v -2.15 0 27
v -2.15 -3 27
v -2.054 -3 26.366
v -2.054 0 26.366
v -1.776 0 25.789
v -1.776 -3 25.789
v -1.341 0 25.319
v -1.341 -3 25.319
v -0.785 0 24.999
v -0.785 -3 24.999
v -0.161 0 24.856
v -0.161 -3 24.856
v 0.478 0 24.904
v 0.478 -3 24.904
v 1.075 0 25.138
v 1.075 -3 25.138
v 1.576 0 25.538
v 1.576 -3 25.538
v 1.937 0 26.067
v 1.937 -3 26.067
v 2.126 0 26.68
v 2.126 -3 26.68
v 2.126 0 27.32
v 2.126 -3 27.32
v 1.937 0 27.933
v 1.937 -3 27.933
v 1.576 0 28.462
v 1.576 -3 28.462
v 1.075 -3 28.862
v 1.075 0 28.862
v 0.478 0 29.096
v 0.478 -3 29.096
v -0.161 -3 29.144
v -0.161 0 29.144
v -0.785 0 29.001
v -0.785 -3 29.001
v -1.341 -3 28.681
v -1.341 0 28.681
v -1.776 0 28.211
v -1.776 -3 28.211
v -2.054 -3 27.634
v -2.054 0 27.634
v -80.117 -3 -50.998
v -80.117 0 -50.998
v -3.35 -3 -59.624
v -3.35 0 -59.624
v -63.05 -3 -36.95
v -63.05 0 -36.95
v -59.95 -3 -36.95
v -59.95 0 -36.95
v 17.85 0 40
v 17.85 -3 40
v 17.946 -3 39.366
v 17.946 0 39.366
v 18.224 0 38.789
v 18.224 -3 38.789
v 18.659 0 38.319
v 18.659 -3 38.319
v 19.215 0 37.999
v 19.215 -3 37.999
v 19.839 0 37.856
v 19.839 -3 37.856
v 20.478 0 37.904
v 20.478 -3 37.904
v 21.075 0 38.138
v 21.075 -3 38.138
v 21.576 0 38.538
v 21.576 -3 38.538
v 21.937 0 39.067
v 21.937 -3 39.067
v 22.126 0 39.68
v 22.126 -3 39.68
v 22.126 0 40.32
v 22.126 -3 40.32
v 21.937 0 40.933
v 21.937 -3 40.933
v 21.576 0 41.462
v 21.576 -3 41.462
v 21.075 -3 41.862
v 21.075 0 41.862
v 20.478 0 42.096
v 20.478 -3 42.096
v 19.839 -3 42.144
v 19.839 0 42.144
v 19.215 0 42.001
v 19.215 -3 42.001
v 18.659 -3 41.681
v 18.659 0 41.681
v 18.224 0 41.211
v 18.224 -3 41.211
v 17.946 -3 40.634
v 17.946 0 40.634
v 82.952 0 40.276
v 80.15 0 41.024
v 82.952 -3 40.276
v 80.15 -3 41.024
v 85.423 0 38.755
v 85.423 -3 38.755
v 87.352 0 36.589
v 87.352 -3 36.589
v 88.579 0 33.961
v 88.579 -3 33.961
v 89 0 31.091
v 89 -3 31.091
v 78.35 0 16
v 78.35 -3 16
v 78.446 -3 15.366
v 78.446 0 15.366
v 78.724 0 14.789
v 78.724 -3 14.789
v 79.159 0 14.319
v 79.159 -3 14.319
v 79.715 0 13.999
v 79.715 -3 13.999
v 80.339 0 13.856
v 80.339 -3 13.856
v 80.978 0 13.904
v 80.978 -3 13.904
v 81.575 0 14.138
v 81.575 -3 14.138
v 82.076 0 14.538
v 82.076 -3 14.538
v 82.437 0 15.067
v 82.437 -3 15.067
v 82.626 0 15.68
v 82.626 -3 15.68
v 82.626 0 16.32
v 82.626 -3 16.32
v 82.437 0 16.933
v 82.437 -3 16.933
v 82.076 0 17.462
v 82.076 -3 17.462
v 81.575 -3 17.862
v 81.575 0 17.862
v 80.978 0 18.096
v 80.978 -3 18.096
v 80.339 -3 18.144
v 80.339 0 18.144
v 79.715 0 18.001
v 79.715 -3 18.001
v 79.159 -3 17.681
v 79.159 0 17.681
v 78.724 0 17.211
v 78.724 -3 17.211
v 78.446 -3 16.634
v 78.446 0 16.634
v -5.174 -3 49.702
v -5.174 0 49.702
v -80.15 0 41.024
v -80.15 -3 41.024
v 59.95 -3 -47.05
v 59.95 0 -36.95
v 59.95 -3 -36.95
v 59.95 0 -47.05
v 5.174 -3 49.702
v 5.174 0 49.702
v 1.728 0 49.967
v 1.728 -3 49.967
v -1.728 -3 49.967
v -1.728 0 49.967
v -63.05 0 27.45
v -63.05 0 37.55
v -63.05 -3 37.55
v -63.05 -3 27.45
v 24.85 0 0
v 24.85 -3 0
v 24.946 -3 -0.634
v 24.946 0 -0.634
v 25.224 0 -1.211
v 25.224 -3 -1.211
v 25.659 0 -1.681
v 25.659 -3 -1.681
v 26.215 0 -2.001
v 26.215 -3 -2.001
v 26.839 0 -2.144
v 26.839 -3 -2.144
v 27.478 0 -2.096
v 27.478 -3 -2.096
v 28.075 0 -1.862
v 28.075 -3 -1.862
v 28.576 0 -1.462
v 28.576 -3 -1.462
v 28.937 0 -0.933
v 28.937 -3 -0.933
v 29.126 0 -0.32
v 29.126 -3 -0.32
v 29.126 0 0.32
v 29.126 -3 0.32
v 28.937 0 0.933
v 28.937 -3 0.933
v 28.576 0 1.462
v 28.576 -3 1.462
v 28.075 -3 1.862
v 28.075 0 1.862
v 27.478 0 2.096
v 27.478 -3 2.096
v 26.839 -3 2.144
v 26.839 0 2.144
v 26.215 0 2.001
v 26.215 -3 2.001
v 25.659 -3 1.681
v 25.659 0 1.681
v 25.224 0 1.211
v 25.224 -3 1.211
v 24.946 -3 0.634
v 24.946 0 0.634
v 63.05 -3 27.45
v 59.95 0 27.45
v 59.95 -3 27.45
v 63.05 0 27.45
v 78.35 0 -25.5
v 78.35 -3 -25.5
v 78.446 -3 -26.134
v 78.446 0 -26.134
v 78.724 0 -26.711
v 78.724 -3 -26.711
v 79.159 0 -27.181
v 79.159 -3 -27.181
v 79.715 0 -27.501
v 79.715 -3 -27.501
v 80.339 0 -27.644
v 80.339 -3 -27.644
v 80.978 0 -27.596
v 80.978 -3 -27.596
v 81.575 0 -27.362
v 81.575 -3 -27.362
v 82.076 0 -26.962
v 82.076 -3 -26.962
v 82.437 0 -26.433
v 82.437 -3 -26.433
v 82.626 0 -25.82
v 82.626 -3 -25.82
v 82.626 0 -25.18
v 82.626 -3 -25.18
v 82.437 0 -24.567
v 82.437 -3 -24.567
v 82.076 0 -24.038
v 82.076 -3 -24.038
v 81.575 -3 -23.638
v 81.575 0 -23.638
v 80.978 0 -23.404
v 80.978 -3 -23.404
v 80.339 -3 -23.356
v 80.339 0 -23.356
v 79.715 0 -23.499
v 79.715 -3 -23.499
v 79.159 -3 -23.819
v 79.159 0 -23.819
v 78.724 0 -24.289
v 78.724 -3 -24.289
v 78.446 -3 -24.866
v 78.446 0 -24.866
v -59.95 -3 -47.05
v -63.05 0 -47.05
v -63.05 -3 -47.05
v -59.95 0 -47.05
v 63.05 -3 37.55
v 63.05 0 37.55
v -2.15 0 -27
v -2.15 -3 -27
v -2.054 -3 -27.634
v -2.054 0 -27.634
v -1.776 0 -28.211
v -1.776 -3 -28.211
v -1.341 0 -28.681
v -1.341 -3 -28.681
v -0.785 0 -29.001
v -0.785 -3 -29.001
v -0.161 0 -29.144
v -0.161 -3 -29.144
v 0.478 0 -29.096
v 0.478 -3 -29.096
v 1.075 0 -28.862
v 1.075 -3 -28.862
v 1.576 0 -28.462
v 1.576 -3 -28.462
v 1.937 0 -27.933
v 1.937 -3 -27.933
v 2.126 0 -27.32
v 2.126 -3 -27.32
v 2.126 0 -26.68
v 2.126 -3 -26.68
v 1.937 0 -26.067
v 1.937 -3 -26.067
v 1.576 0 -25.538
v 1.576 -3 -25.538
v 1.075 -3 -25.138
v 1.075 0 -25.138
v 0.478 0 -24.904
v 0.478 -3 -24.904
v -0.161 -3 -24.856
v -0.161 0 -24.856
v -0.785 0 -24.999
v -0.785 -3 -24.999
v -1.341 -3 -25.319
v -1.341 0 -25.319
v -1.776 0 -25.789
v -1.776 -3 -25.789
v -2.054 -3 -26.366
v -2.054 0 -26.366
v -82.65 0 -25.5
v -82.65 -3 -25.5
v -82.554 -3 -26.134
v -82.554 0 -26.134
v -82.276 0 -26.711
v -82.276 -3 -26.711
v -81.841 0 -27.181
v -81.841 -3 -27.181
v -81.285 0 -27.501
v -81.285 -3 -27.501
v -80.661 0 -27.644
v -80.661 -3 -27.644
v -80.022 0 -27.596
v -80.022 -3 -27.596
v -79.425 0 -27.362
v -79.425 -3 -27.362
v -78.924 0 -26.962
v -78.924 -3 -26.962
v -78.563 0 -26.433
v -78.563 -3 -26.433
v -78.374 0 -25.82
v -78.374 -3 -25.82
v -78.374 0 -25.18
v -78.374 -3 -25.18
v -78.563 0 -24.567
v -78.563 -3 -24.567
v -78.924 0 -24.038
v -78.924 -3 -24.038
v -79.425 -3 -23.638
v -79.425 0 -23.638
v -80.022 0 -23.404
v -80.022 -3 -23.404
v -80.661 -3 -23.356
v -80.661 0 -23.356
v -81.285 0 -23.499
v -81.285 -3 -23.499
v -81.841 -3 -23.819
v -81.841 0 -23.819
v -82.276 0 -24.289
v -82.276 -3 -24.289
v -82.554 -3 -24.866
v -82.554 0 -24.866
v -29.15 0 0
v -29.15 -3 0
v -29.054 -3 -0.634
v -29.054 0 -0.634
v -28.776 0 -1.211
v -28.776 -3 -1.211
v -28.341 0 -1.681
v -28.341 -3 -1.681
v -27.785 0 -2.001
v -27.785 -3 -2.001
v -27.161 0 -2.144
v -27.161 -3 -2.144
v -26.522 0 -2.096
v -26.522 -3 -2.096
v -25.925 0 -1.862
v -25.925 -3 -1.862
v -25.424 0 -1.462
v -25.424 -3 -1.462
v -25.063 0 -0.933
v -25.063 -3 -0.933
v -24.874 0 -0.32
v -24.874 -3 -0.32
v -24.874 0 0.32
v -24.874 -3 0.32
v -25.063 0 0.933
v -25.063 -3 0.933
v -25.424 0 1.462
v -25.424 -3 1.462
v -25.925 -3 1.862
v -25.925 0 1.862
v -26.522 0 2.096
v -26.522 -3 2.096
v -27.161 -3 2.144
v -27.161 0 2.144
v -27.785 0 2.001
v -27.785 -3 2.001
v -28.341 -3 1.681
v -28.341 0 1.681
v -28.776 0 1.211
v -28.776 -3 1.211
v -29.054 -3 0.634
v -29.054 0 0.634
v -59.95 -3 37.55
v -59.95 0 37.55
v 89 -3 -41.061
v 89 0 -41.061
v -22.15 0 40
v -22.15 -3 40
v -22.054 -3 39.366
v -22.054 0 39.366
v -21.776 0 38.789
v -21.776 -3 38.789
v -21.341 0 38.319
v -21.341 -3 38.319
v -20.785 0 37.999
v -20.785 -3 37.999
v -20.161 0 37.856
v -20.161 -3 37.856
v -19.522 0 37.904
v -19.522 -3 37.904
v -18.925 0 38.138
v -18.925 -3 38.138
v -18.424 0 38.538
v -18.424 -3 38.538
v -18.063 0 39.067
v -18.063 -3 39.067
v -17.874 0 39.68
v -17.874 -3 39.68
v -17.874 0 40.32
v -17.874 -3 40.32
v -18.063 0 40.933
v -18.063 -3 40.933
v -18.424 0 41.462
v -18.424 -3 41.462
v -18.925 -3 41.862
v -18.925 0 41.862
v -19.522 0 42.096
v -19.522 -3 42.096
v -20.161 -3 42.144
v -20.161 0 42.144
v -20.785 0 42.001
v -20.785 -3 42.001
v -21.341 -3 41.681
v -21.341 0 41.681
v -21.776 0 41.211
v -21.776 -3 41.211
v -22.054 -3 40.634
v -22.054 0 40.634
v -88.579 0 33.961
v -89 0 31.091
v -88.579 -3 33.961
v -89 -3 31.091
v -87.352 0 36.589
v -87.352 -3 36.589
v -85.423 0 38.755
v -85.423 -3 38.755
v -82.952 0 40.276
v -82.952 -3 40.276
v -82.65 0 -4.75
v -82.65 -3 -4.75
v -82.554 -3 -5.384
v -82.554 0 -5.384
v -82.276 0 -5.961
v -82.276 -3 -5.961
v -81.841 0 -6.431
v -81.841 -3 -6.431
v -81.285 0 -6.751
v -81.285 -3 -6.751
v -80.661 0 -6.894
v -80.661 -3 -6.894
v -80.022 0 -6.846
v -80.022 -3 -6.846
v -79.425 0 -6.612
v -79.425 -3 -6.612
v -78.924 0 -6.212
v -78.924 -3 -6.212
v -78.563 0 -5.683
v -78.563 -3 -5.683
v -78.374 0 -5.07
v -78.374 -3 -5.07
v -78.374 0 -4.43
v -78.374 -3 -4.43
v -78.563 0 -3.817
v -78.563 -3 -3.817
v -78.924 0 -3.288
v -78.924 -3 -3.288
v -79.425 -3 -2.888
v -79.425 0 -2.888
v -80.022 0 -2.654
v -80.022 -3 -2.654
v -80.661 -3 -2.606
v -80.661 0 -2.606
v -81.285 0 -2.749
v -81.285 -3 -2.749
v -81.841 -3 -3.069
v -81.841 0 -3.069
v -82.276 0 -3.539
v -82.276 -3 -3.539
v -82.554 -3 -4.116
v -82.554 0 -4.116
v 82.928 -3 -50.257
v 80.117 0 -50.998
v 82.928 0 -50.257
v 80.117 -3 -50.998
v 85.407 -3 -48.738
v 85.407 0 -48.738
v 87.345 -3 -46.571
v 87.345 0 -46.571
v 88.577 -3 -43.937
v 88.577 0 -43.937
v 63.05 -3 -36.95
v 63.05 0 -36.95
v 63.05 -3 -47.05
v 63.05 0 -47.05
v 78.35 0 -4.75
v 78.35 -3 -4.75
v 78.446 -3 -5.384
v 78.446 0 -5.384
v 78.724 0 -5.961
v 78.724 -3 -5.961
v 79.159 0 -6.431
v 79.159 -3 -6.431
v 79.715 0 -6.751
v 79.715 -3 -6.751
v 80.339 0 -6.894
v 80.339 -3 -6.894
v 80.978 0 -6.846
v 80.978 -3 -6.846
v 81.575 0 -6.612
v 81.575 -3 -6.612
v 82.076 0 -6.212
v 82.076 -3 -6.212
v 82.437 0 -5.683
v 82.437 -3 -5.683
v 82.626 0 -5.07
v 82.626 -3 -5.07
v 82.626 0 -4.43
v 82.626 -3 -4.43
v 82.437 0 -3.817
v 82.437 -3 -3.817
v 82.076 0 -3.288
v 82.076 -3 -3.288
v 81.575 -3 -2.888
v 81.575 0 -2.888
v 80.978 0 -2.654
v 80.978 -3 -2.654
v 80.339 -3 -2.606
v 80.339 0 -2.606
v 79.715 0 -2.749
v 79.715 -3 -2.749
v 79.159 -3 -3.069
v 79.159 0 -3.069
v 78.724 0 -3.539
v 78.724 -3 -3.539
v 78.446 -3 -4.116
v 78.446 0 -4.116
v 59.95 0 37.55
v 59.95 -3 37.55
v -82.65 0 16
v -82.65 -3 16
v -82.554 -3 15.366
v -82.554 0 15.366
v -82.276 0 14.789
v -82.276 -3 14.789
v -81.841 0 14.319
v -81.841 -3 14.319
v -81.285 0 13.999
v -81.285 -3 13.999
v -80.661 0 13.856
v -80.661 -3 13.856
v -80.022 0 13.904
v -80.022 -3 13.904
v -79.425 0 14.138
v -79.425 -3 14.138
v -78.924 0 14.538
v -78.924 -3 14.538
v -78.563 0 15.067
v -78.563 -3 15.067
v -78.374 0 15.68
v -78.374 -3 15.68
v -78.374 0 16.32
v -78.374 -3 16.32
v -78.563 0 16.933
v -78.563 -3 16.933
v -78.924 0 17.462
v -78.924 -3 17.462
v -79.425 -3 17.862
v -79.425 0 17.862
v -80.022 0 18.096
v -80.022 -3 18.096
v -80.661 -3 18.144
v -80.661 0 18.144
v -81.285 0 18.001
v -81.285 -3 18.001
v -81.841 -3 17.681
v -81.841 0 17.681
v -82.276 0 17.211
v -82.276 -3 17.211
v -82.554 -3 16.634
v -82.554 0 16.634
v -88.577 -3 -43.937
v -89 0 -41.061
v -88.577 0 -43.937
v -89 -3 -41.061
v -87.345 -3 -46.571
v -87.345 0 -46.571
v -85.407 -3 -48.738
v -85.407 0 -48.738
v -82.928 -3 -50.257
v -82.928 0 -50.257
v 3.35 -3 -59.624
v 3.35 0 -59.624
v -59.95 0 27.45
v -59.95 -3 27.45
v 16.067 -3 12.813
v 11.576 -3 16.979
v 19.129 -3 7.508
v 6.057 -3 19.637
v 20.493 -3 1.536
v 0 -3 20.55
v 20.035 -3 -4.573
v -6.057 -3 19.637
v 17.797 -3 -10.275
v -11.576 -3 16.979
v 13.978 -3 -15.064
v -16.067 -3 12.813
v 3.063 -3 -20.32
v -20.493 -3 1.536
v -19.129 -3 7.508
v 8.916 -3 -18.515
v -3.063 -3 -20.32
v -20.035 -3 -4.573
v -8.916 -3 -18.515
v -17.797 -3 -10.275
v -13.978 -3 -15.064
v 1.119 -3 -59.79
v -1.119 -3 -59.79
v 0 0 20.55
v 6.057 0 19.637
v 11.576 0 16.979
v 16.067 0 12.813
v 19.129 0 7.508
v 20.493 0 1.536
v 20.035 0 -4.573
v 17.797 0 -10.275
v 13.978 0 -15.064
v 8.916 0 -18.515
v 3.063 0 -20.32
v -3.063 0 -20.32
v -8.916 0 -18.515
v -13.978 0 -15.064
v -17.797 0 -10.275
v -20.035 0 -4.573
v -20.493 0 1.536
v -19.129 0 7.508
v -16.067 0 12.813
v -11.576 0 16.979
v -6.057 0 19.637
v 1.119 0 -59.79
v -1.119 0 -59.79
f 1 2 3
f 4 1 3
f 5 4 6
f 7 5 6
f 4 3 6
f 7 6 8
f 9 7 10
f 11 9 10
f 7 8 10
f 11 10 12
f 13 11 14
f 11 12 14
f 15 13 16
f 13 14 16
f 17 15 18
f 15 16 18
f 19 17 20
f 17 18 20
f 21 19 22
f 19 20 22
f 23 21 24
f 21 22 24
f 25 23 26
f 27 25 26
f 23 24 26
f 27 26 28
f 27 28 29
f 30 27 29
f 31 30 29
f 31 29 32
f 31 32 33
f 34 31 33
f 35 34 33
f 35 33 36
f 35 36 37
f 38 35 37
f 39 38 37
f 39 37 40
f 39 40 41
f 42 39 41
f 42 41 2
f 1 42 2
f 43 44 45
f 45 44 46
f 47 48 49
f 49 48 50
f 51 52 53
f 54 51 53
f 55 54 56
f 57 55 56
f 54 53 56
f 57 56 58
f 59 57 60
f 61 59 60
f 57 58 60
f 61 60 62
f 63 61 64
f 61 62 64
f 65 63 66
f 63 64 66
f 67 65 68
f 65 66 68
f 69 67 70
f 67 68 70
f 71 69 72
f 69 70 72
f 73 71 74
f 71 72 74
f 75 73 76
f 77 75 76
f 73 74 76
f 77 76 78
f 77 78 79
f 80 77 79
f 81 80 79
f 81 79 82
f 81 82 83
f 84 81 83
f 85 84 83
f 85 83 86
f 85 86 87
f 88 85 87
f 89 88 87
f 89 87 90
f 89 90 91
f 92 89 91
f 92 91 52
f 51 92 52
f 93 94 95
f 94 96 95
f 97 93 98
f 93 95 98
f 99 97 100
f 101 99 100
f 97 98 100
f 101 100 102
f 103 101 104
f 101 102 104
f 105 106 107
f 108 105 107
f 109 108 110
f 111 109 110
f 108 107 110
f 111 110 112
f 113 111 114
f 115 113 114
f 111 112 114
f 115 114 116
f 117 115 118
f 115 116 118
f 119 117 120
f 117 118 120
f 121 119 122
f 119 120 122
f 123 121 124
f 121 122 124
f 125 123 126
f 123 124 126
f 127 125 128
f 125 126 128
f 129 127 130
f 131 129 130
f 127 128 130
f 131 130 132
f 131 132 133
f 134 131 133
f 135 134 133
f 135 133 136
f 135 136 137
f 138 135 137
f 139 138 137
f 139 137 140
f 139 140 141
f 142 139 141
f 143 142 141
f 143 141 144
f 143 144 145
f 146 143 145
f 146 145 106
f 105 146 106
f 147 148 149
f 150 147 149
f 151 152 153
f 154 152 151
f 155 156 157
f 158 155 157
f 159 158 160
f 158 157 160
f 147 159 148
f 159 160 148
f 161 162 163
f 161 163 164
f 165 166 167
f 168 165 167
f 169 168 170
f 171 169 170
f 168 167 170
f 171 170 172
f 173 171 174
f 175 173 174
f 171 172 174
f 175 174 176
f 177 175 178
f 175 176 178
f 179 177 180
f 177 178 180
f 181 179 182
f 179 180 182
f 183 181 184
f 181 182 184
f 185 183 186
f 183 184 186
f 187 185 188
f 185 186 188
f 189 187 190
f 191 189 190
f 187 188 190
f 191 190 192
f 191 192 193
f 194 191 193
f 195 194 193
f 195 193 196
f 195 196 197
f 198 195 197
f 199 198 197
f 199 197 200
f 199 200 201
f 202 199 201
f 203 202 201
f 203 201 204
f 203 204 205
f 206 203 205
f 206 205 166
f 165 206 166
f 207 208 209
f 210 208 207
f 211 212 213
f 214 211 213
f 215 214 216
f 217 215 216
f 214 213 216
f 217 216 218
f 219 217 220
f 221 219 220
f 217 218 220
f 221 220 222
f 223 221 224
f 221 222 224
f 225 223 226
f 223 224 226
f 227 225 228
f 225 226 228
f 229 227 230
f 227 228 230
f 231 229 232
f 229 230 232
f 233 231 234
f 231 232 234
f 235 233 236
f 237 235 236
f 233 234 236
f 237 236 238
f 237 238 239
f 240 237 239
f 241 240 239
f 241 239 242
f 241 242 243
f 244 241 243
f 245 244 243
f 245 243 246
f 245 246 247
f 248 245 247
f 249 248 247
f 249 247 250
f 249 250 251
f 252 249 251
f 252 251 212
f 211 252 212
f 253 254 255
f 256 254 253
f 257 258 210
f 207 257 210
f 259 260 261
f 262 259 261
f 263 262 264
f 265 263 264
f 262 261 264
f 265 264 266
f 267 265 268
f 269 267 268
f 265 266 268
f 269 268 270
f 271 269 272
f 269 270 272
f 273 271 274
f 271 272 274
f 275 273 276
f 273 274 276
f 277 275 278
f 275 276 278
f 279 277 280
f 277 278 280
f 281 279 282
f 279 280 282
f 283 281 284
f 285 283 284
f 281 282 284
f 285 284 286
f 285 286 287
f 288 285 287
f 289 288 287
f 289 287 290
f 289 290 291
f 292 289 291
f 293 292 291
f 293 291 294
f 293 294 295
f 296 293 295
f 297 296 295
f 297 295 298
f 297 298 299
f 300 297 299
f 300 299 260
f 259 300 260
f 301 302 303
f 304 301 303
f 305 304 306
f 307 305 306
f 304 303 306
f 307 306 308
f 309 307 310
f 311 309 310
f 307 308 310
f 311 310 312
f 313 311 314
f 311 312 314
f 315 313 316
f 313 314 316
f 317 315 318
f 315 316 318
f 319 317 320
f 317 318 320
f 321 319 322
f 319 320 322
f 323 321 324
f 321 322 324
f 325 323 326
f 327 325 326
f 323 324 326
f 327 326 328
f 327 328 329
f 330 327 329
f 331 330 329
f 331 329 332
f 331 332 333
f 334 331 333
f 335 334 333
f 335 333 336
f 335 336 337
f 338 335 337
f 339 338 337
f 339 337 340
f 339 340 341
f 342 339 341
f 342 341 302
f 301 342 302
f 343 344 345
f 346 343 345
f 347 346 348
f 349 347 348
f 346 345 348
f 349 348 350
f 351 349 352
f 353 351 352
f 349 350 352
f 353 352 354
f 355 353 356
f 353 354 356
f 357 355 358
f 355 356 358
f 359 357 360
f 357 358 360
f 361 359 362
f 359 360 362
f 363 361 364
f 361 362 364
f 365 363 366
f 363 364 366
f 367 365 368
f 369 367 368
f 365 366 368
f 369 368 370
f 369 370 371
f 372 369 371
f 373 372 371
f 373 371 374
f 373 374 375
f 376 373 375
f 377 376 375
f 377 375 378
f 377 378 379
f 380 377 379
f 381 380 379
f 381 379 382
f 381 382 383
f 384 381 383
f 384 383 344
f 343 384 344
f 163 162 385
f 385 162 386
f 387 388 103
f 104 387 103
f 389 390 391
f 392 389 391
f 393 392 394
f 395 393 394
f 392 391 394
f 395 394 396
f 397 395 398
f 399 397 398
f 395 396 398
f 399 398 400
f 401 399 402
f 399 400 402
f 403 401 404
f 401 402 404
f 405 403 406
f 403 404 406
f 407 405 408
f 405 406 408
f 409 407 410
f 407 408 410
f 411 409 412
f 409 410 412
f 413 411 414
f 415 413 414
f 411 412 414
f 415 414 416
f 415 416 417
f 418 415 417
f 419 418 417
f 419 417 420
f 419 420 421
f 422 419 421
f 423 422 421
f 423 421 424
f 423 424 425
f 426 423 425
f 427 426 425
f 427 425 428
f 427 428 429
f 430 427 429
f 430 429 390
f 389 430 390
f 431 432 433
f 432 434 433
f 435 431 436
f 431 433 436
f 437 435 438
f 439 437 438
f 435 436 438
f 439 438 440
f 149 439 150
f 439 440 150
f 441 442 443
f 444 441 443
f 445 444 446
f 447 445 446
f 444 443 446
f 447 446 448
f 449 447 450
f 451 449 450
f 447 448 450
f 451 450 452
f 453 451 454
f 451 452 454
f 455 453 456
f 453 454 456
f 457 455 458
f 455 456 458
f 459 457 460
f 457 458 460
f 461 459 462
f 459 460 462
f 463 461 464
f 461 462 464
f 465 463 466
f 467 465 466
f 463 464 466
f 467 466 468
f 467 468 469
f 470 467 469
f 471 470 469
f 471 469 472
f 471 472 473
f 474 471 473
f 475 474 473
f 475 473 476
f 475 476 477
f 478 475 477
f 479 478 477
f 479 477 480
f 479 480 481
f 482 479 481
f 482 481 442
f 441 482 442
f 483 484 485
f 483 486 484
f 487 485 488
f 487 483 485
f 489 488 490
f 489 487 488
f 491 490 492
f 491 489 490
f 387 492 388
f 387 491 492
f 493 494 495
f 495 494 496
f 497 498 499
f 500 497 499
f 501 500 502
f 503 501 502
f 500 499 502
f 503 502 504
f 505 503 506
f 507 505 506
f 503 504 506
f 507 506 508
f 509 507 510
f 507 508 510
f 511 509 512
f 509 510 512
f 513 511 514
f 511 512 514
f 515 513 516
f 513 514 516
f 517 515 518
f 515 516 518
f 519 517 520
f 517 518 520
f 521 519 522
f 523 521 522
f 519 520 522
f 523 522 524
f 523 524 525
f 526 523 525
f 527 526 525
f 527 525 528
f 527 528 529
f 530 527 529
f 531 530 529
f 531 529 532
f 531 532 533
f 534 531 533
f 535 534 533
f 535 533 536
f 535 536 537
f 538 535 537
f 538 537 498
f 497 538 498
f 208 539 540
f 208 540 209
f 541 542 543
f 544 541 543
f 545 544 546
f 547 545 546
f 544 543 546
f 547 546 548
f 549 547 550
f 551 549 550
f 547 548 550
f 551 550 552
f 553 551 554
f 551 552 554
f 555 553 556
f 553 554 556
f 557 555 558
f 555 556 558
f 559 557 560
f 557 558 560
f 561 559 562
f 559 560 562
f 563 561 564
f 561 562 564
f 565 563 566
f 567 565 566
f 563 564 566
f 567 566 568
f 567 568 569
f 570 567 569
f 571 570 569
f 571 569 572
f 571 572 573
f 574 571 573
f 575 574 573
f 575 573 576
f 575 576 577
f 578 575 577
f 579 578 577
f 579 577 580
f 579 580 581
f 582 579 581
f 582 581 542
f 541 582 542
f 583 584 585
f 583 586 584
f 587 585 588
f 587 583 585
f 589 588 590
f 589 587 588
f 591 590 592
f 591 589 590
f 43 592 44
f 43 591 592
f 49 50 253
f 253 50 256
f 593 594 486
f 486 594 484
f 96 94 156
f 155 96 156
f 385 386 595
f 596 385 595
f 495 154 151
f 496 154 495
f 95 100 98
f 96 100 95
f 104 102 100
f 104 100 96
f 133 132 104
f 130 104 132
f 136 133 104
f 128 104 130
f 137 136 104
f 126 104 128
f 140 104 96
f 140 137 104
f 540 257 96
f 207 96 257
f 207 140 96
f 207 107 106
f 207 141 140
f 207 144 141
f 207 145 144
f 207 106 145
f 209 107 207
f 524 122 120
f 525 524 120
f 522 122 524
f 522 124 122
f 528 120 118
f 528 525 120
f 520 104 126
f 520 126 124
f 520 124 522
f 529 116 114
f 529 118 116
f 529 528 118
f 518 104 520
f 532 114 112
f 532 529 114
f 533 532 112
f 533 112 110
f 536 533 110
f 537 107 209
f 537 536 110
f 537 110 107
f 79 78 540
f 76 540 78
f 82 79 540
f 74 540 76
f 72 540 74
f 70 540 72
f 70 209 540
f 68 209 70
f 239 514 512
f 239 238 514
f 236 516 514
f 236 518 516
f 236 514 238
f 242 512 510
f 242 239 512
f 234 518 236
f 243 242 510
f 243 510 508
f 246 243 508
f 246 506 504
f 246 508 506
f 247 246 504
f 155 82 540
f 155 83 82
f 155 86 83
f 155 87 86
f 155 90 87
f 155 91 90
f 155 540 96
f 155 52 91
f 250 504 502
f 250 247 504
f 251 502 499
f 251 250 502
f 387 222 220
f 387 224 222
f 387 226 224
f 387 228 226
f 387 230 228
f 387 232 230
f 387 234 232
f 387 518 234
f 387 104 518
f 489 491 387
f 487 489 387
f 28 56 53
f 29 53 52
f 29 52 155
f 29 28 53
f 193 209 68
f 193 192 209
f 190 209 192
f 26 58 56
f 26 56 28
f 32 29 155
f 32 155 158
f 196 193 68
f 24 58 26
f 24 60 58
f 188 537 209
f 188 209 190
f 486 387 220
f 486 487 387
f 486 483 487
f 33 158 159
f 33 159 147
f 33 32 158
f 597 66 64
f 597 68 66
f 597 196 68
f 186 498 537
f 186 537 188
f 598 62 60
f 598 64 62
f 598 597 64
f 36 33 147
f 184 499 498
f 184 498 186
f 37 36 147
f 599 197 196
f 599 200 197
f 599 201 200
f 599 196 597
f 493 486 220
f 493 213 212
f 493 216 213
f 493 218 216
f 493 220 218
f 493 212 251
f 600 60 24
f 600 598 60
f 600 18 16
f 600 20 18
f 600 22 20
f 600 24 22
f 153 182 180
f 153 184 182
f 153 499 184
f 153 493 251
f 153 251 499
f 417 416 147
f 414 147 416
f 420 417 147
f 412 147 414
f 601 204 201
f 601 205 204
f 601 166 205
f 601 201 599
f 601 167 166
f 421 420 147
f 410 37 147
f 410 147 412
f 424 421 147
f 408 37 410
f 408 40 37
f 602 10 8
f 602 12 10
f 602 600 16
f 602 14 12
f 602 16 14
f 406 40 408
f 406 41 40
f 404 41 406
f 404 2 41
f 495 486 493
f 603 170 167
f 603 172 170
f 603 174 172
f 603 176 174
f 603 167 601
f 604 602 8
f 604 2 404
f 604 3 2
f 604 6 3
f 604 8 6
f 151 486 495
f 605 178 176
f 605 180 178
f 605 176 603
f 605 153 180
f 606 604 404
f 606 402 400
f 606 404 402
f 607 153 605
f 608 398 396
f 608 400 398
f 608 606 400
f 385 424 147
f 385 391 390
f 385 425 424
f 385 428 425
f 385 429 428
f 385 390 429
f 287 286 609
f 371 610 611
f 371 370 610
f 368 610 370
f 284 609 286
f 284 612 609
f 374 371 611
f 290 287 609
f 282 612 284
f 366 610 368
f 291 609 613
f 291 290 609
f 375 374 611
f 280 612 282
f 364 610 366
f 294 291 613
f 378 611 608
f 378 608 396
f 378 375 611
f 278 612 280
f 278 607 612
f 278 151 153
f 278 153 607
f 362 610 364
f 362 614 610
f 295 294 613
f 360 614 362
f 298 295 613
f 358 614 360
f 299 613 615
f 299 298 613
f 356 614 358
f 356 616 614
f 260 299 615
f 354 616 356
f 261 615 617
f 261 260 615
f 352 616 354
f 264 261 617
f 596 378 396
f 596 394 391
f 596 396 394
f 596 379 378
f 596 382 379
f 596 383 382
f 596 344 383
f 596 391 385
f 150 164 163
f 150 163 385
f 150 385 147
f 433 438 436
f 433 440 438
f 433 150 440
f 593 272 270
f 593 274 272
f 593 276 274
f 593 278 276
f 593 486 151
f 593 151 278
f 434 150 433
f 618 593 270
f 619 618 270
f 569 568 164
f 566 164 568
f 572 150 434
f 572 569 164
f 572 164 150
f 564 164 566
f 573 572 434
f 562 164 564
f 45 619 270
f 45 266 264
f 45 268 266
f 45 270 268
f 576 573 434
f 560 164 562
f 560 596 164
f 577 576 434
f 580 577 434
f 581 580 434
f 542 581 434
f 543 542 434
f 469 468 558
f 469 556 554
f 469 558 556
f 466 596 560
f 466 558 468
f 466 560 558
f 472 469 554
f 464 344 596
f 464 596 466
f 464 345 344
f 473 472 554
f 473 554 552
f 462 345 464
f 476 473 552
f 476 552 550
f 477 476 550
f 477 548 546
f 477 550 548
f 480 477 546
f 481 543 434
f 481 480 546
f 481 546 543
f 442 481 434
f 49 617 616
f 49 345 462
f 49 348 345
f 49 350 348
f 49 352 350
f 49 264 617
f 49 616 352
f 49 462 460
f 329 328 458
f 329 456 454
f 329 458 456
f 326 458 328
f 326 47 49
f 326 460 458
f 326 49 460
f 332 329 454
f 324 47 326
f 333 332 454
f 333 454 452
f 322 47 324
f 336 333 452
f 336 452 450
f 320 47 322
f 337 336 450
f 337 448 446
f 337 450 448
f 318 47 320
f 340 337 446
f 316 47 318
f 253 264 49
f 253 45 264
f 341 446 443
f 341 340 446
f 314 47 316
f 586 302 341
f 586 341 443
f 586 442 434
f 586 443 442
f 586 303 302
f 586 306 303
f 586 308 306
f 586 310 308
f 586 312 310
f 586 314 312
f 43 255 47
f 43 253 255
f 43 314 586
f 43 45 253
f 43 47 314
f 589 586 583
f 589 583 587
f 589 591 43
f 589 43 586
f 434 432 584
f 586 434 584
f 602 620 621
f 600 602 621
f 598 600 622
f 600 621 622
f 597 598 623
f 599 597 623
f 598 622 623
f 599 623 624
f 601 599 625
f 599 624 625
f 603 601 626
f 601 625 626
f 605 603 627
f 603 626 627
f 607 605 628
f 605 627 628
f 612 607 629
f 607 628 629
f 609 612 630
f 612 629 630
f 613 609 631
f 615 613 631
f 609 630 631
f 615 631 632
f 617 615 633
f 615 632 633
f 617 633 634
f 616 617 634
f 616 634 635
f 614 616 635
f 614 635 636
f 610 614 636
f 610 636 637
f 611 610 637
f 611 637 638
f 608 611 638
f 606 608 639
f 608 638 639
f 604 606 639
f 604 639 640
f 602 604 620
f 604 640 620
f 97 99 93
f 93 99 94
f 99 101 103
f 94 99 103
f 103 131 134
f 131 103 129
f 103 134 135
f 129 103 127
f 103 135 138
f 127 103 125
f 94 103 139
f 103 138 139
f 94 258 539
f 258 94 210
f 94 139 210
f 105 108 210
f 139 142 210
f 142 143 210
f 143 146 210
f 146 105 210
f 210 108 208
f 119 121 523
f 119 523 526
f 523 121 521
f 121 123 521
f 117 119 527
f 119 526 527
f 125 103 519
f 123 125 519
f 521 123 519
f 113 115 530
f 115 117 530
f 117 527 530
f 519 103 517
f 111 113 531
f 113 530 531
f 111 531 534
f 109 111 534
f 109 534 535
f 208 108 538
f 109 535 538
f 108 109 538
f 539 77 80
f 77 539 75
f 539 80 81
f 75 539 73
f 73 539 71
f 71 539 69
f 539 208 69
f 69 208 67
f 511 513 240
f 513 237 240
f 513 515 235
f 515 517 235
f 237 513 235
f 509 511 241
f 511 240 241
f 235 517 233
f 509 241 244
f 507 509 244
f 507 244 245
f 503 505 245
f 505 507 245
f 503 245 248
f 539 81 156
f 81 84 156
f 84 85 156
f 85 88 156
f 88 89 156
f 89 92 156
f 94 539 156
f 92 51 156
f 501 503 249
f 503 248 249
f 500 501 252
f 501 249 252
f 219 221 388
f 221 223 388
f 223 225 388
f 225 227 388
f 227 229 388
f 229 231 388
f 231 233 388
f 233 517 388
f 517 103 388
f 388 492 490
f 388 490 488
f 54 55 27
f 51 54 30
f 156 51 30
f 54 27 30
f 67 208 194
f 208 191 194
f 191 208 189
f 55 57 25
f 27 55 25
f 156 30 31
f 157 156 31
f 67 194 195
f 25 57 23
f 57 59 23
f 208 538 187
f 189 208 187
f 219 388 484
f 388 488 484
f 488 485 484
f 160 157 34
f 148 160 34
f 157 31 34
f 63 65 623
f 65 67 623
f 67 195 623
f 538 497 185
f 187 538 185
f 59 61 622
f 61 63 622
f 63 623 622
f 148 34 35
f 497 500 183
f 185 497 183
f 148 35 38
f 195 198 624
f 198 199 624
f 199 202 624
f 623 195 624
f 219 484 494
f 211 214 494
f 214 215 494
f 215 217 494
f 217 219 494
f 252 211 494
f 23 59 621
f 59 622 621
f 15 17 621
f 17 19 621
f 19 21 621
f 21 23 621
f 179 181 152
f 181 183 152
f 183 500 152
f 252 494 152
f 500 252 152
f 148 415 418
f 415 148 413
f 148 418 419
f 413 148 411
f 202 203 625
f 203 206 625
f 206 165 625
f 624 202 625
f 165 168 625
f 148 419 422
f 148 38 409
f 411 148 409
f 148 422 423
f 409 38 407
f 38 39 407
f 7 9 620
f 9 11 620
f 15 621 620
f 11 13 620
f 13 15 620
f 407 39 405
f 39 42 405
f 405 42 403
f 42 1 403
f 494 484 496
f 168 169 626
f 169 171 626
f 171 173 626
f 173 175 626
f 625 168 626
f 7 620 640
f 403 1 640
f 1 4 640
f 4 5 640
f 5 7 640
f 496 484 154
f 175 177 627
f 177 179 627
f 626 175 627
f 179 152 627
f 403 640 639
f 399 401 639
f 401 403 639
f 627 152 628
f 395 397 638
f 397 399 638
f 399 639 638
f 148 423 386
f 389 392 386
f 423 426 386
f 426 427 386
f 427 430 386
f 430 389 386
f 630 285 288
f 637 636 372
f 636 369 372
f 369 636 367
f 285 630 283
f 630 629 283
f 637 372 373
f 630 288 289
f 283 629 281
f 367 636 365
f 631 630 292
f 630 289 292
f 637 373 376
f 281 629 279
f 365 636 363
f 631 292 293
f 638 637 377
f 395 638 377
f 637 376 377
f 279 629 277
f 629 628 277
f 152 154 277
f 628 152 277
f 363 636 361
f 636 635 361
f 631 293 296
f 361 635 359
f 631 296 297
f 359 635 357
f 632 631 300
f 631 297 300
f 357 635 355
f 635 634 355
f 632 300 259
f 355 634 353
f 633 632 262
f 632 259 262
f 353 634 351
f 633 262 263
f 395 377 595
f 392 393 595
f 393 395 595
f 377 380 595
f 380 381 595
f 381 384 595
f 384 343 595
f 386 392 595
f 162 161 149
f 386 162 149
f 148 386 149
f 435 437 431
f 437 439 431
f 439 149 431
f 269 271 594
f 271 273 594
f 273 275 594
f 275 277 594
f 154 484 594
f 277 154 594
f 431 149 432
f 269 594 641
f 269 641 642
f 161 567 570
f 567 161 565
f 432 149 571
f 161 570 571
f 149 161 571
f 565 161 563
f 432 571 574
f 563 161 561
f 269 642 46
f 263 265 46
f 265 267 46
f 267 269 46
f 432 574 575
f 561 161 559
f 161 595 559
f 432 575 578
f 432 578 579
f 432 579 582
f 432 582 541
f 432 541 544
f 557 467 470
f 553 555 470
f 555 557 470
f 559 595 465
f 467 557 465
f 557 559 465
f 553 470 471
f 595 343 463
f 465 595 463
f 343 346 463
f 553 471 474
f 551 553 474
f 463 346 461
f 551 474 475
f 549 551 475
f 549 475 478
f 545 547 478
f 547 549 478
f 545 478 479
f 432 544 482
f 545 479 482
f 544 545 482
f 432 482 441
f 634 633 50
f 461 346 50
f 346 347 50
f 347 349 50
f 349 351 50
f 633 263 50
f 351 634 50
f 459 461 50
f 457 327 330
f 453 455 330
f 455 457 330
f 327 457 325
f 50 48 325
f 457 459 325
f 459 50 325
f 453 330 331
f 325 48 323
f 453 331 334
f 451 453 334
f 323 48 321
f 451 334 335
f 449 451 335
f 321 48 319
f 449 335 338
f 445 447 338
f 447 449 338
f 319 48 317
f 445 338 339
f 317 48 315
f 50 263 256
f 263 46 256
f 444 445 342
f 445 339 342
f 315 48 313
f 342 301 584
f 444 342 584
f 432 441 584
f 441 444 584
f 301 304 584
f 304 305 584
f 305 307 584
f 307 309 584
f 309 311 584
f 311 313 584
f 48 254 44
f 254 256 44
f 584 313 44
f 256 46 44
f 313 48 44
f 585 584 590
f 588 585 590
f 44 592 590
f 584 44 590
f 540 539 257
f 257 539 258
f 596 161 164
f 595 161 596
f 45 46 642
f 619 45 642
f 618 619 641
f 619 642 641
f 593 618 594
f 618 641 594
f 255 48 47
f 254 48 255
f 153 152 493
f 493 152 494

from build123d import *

# Parameters (mm, degrees)
SKETCH1_R                = 20.55
SKETCH1_R_2              = 1
SKETCH1_W                = 3.1
SKETCH1_H                = 10.1
BASE_FLANGE1_DEPTH       = 3
FILLET1_R                = 10
M4_CLEARANCE_HOLE2_D     = 4.3
M4_CLEARANCE_HOLE2_DEPTH = 136
M4_CLEARANCE_HOLE2_TIP   = 1.291850331


# Sheet-metal steps are written as plain solids
with BuildPart() as part:
    # Sketch1 → Base-Flange1 (new body)
    with BuildSketch(Plane(origin=(0, 0, 0), x_dir=(1, 0, 0), z_dir=(0, 1, 0))):
        with BuildLine():
            Line((-89, -40), (-89, 50))
            Line((-89, 50), (-3.349708355, 59.623628275))
            ThreePointArc((-3.349708355, 59.623628275), (0, 59.811223911), (3.349708355, 59.623628275))
            Line((3.349708355, 59.623628275), (89, 50))
            Line((89, 50), (89, -40))
            Line((89, -40), (5.17352088, -49.701618334))
            ThreePointArc((5.17352088, -49.701618334), (0, -50), (-5.17352088, -49.701618334))
            Line((-5.17352088, -49.701618334), (-89, -40))
        make_face()
        with Locations(Location((0, 0, 0), (0, 0, 270))):
            Circle(SKETCH1_R, mode=Mode.SUBTRACT)
        with Locations(Location((0, 27, 0), (0, 0, 270))):
            Circle(SKETCH1_R_2, mode=Mode.SUBTRACT)
        with Locations(Location((-80.5, 25.5, 0), (0, 0, 270))):
            Circle(SKETCH1_R_2, mode=Mode.SUBTRACT)
        with Locations(Location((-80.5, 4.75, 0), (0, 0, 270))):
            Circle(SKETCH1_R_2, mode=Mode.SUBTRACT)
        with Locations(Location((-80.5, -16, 0), (0, 0, 270))):
            Circle(SKETCH1_R_2, mode=Mode.SUBTRACT)
        with Locations(Location((80.5, -16, 0), (0, 0, 90))):
            Circle(SKETCH1_R_2, mode=Mode.SUBTRACT)
        with Locations(Location((80.5, 4.75, 0), (0, 0, 90))):
            Circle(SKETCH1_R_2, mode=Mode.SUBTRACT)
        with Locations(Location((80.5, 25.5, 0), (0, 0, 90))):
            Circle(SKETCH1_R_2, mode=Mode.SUBTRACT)
        with Locations(Location((27, 0, 0), (0, 0, 270))):
            Circle(SKETCH1_R_2, mode=Mode.SUBTRACT)
        with Locations(Location((0, -27, 0), (0, 0, 270))):
            Circle(SKETCH1_R_2, mode=Mode.SUBTRACT)
        with Locations(Location((-27, 0, 0), (0, 0, 270))):
            Circle(SKETCH1_R_2, mode=Mode.SUBTRACT)
        with Locations(Location((20, -40, 0), (0, 0, 270))):
            Circle(SKETCH1_R_2, mode=Mode.SUBTRACT)
        with Locations(Location((-20, -40, 0), (0, 0, 270))):
            Circle(SKETCH1_R_2, mode=Mode.SUBTRACT)
        with Locations((-61.5, 42)):
            Rectangle(SKETCH1_W, SKETCH1_H, mode=Mode.SUBTRACT)
        with Locations((-61.5, -32.5)):
            Rectangle(SKETCH1_W, SKETCH1_H, mode=Mode.SUBTRACT)
        with Locations((61.5, -32.5)):
            Rectangle(SKETCH1_W, SKETCH1_H, mode=Mode.SUBTRACT)
        with Locations((61.5, 42)):
            Rectangle(SKETCH1_W, SKETCH1_H, mode=Mode.SUBTRACT)
    extrude(amount=-BASE_FLANGE1_DEPTH)

    # Fillet1
    fillet1_edges = [part.edges().sort_by_distance(p)[0] for p in [
        (89, -1.5, -50),
        (89, -1.5, 40),
        (-89, -1.5, 40),
        (-89, -1.5, -50),
    ]]
    fillet(fillet1_edges, radius=FILLET1_R)

    # M4 Clearance Hole2
    with Locations(Plane(origin=(0, 0, 0), x_dir=(1, 0, 0), z_dir=(0, 1, 0))):
        with Locations((-27, 0), (0, 27), (27, 0), (0, -27), (20, -40), (-20, -40), (80.5, -16), (80.5, 25.5), (80.5, 4.75), (-80.5, 25.5), (-80.5, 4.75), (-80.5, -16)):
            Hole(M4_CLEARANCE_HOLE2_D / 2, depth=M4_CLEARANCE_HOLE2_DEPTH)
            with Locations((0, 0, -(M4_CLEARANCE_HOLE2_DEPTH + M4_CLEARANCE_HOLE2_TIP / 2))):  # 118° drill point
                Cone(0, M4_CLEARANCE_HOLE2_D / 2, M4_CLEARANCE_HOLE2_TIP, mode=Mode.SUBTRACT)


solid = part.part
